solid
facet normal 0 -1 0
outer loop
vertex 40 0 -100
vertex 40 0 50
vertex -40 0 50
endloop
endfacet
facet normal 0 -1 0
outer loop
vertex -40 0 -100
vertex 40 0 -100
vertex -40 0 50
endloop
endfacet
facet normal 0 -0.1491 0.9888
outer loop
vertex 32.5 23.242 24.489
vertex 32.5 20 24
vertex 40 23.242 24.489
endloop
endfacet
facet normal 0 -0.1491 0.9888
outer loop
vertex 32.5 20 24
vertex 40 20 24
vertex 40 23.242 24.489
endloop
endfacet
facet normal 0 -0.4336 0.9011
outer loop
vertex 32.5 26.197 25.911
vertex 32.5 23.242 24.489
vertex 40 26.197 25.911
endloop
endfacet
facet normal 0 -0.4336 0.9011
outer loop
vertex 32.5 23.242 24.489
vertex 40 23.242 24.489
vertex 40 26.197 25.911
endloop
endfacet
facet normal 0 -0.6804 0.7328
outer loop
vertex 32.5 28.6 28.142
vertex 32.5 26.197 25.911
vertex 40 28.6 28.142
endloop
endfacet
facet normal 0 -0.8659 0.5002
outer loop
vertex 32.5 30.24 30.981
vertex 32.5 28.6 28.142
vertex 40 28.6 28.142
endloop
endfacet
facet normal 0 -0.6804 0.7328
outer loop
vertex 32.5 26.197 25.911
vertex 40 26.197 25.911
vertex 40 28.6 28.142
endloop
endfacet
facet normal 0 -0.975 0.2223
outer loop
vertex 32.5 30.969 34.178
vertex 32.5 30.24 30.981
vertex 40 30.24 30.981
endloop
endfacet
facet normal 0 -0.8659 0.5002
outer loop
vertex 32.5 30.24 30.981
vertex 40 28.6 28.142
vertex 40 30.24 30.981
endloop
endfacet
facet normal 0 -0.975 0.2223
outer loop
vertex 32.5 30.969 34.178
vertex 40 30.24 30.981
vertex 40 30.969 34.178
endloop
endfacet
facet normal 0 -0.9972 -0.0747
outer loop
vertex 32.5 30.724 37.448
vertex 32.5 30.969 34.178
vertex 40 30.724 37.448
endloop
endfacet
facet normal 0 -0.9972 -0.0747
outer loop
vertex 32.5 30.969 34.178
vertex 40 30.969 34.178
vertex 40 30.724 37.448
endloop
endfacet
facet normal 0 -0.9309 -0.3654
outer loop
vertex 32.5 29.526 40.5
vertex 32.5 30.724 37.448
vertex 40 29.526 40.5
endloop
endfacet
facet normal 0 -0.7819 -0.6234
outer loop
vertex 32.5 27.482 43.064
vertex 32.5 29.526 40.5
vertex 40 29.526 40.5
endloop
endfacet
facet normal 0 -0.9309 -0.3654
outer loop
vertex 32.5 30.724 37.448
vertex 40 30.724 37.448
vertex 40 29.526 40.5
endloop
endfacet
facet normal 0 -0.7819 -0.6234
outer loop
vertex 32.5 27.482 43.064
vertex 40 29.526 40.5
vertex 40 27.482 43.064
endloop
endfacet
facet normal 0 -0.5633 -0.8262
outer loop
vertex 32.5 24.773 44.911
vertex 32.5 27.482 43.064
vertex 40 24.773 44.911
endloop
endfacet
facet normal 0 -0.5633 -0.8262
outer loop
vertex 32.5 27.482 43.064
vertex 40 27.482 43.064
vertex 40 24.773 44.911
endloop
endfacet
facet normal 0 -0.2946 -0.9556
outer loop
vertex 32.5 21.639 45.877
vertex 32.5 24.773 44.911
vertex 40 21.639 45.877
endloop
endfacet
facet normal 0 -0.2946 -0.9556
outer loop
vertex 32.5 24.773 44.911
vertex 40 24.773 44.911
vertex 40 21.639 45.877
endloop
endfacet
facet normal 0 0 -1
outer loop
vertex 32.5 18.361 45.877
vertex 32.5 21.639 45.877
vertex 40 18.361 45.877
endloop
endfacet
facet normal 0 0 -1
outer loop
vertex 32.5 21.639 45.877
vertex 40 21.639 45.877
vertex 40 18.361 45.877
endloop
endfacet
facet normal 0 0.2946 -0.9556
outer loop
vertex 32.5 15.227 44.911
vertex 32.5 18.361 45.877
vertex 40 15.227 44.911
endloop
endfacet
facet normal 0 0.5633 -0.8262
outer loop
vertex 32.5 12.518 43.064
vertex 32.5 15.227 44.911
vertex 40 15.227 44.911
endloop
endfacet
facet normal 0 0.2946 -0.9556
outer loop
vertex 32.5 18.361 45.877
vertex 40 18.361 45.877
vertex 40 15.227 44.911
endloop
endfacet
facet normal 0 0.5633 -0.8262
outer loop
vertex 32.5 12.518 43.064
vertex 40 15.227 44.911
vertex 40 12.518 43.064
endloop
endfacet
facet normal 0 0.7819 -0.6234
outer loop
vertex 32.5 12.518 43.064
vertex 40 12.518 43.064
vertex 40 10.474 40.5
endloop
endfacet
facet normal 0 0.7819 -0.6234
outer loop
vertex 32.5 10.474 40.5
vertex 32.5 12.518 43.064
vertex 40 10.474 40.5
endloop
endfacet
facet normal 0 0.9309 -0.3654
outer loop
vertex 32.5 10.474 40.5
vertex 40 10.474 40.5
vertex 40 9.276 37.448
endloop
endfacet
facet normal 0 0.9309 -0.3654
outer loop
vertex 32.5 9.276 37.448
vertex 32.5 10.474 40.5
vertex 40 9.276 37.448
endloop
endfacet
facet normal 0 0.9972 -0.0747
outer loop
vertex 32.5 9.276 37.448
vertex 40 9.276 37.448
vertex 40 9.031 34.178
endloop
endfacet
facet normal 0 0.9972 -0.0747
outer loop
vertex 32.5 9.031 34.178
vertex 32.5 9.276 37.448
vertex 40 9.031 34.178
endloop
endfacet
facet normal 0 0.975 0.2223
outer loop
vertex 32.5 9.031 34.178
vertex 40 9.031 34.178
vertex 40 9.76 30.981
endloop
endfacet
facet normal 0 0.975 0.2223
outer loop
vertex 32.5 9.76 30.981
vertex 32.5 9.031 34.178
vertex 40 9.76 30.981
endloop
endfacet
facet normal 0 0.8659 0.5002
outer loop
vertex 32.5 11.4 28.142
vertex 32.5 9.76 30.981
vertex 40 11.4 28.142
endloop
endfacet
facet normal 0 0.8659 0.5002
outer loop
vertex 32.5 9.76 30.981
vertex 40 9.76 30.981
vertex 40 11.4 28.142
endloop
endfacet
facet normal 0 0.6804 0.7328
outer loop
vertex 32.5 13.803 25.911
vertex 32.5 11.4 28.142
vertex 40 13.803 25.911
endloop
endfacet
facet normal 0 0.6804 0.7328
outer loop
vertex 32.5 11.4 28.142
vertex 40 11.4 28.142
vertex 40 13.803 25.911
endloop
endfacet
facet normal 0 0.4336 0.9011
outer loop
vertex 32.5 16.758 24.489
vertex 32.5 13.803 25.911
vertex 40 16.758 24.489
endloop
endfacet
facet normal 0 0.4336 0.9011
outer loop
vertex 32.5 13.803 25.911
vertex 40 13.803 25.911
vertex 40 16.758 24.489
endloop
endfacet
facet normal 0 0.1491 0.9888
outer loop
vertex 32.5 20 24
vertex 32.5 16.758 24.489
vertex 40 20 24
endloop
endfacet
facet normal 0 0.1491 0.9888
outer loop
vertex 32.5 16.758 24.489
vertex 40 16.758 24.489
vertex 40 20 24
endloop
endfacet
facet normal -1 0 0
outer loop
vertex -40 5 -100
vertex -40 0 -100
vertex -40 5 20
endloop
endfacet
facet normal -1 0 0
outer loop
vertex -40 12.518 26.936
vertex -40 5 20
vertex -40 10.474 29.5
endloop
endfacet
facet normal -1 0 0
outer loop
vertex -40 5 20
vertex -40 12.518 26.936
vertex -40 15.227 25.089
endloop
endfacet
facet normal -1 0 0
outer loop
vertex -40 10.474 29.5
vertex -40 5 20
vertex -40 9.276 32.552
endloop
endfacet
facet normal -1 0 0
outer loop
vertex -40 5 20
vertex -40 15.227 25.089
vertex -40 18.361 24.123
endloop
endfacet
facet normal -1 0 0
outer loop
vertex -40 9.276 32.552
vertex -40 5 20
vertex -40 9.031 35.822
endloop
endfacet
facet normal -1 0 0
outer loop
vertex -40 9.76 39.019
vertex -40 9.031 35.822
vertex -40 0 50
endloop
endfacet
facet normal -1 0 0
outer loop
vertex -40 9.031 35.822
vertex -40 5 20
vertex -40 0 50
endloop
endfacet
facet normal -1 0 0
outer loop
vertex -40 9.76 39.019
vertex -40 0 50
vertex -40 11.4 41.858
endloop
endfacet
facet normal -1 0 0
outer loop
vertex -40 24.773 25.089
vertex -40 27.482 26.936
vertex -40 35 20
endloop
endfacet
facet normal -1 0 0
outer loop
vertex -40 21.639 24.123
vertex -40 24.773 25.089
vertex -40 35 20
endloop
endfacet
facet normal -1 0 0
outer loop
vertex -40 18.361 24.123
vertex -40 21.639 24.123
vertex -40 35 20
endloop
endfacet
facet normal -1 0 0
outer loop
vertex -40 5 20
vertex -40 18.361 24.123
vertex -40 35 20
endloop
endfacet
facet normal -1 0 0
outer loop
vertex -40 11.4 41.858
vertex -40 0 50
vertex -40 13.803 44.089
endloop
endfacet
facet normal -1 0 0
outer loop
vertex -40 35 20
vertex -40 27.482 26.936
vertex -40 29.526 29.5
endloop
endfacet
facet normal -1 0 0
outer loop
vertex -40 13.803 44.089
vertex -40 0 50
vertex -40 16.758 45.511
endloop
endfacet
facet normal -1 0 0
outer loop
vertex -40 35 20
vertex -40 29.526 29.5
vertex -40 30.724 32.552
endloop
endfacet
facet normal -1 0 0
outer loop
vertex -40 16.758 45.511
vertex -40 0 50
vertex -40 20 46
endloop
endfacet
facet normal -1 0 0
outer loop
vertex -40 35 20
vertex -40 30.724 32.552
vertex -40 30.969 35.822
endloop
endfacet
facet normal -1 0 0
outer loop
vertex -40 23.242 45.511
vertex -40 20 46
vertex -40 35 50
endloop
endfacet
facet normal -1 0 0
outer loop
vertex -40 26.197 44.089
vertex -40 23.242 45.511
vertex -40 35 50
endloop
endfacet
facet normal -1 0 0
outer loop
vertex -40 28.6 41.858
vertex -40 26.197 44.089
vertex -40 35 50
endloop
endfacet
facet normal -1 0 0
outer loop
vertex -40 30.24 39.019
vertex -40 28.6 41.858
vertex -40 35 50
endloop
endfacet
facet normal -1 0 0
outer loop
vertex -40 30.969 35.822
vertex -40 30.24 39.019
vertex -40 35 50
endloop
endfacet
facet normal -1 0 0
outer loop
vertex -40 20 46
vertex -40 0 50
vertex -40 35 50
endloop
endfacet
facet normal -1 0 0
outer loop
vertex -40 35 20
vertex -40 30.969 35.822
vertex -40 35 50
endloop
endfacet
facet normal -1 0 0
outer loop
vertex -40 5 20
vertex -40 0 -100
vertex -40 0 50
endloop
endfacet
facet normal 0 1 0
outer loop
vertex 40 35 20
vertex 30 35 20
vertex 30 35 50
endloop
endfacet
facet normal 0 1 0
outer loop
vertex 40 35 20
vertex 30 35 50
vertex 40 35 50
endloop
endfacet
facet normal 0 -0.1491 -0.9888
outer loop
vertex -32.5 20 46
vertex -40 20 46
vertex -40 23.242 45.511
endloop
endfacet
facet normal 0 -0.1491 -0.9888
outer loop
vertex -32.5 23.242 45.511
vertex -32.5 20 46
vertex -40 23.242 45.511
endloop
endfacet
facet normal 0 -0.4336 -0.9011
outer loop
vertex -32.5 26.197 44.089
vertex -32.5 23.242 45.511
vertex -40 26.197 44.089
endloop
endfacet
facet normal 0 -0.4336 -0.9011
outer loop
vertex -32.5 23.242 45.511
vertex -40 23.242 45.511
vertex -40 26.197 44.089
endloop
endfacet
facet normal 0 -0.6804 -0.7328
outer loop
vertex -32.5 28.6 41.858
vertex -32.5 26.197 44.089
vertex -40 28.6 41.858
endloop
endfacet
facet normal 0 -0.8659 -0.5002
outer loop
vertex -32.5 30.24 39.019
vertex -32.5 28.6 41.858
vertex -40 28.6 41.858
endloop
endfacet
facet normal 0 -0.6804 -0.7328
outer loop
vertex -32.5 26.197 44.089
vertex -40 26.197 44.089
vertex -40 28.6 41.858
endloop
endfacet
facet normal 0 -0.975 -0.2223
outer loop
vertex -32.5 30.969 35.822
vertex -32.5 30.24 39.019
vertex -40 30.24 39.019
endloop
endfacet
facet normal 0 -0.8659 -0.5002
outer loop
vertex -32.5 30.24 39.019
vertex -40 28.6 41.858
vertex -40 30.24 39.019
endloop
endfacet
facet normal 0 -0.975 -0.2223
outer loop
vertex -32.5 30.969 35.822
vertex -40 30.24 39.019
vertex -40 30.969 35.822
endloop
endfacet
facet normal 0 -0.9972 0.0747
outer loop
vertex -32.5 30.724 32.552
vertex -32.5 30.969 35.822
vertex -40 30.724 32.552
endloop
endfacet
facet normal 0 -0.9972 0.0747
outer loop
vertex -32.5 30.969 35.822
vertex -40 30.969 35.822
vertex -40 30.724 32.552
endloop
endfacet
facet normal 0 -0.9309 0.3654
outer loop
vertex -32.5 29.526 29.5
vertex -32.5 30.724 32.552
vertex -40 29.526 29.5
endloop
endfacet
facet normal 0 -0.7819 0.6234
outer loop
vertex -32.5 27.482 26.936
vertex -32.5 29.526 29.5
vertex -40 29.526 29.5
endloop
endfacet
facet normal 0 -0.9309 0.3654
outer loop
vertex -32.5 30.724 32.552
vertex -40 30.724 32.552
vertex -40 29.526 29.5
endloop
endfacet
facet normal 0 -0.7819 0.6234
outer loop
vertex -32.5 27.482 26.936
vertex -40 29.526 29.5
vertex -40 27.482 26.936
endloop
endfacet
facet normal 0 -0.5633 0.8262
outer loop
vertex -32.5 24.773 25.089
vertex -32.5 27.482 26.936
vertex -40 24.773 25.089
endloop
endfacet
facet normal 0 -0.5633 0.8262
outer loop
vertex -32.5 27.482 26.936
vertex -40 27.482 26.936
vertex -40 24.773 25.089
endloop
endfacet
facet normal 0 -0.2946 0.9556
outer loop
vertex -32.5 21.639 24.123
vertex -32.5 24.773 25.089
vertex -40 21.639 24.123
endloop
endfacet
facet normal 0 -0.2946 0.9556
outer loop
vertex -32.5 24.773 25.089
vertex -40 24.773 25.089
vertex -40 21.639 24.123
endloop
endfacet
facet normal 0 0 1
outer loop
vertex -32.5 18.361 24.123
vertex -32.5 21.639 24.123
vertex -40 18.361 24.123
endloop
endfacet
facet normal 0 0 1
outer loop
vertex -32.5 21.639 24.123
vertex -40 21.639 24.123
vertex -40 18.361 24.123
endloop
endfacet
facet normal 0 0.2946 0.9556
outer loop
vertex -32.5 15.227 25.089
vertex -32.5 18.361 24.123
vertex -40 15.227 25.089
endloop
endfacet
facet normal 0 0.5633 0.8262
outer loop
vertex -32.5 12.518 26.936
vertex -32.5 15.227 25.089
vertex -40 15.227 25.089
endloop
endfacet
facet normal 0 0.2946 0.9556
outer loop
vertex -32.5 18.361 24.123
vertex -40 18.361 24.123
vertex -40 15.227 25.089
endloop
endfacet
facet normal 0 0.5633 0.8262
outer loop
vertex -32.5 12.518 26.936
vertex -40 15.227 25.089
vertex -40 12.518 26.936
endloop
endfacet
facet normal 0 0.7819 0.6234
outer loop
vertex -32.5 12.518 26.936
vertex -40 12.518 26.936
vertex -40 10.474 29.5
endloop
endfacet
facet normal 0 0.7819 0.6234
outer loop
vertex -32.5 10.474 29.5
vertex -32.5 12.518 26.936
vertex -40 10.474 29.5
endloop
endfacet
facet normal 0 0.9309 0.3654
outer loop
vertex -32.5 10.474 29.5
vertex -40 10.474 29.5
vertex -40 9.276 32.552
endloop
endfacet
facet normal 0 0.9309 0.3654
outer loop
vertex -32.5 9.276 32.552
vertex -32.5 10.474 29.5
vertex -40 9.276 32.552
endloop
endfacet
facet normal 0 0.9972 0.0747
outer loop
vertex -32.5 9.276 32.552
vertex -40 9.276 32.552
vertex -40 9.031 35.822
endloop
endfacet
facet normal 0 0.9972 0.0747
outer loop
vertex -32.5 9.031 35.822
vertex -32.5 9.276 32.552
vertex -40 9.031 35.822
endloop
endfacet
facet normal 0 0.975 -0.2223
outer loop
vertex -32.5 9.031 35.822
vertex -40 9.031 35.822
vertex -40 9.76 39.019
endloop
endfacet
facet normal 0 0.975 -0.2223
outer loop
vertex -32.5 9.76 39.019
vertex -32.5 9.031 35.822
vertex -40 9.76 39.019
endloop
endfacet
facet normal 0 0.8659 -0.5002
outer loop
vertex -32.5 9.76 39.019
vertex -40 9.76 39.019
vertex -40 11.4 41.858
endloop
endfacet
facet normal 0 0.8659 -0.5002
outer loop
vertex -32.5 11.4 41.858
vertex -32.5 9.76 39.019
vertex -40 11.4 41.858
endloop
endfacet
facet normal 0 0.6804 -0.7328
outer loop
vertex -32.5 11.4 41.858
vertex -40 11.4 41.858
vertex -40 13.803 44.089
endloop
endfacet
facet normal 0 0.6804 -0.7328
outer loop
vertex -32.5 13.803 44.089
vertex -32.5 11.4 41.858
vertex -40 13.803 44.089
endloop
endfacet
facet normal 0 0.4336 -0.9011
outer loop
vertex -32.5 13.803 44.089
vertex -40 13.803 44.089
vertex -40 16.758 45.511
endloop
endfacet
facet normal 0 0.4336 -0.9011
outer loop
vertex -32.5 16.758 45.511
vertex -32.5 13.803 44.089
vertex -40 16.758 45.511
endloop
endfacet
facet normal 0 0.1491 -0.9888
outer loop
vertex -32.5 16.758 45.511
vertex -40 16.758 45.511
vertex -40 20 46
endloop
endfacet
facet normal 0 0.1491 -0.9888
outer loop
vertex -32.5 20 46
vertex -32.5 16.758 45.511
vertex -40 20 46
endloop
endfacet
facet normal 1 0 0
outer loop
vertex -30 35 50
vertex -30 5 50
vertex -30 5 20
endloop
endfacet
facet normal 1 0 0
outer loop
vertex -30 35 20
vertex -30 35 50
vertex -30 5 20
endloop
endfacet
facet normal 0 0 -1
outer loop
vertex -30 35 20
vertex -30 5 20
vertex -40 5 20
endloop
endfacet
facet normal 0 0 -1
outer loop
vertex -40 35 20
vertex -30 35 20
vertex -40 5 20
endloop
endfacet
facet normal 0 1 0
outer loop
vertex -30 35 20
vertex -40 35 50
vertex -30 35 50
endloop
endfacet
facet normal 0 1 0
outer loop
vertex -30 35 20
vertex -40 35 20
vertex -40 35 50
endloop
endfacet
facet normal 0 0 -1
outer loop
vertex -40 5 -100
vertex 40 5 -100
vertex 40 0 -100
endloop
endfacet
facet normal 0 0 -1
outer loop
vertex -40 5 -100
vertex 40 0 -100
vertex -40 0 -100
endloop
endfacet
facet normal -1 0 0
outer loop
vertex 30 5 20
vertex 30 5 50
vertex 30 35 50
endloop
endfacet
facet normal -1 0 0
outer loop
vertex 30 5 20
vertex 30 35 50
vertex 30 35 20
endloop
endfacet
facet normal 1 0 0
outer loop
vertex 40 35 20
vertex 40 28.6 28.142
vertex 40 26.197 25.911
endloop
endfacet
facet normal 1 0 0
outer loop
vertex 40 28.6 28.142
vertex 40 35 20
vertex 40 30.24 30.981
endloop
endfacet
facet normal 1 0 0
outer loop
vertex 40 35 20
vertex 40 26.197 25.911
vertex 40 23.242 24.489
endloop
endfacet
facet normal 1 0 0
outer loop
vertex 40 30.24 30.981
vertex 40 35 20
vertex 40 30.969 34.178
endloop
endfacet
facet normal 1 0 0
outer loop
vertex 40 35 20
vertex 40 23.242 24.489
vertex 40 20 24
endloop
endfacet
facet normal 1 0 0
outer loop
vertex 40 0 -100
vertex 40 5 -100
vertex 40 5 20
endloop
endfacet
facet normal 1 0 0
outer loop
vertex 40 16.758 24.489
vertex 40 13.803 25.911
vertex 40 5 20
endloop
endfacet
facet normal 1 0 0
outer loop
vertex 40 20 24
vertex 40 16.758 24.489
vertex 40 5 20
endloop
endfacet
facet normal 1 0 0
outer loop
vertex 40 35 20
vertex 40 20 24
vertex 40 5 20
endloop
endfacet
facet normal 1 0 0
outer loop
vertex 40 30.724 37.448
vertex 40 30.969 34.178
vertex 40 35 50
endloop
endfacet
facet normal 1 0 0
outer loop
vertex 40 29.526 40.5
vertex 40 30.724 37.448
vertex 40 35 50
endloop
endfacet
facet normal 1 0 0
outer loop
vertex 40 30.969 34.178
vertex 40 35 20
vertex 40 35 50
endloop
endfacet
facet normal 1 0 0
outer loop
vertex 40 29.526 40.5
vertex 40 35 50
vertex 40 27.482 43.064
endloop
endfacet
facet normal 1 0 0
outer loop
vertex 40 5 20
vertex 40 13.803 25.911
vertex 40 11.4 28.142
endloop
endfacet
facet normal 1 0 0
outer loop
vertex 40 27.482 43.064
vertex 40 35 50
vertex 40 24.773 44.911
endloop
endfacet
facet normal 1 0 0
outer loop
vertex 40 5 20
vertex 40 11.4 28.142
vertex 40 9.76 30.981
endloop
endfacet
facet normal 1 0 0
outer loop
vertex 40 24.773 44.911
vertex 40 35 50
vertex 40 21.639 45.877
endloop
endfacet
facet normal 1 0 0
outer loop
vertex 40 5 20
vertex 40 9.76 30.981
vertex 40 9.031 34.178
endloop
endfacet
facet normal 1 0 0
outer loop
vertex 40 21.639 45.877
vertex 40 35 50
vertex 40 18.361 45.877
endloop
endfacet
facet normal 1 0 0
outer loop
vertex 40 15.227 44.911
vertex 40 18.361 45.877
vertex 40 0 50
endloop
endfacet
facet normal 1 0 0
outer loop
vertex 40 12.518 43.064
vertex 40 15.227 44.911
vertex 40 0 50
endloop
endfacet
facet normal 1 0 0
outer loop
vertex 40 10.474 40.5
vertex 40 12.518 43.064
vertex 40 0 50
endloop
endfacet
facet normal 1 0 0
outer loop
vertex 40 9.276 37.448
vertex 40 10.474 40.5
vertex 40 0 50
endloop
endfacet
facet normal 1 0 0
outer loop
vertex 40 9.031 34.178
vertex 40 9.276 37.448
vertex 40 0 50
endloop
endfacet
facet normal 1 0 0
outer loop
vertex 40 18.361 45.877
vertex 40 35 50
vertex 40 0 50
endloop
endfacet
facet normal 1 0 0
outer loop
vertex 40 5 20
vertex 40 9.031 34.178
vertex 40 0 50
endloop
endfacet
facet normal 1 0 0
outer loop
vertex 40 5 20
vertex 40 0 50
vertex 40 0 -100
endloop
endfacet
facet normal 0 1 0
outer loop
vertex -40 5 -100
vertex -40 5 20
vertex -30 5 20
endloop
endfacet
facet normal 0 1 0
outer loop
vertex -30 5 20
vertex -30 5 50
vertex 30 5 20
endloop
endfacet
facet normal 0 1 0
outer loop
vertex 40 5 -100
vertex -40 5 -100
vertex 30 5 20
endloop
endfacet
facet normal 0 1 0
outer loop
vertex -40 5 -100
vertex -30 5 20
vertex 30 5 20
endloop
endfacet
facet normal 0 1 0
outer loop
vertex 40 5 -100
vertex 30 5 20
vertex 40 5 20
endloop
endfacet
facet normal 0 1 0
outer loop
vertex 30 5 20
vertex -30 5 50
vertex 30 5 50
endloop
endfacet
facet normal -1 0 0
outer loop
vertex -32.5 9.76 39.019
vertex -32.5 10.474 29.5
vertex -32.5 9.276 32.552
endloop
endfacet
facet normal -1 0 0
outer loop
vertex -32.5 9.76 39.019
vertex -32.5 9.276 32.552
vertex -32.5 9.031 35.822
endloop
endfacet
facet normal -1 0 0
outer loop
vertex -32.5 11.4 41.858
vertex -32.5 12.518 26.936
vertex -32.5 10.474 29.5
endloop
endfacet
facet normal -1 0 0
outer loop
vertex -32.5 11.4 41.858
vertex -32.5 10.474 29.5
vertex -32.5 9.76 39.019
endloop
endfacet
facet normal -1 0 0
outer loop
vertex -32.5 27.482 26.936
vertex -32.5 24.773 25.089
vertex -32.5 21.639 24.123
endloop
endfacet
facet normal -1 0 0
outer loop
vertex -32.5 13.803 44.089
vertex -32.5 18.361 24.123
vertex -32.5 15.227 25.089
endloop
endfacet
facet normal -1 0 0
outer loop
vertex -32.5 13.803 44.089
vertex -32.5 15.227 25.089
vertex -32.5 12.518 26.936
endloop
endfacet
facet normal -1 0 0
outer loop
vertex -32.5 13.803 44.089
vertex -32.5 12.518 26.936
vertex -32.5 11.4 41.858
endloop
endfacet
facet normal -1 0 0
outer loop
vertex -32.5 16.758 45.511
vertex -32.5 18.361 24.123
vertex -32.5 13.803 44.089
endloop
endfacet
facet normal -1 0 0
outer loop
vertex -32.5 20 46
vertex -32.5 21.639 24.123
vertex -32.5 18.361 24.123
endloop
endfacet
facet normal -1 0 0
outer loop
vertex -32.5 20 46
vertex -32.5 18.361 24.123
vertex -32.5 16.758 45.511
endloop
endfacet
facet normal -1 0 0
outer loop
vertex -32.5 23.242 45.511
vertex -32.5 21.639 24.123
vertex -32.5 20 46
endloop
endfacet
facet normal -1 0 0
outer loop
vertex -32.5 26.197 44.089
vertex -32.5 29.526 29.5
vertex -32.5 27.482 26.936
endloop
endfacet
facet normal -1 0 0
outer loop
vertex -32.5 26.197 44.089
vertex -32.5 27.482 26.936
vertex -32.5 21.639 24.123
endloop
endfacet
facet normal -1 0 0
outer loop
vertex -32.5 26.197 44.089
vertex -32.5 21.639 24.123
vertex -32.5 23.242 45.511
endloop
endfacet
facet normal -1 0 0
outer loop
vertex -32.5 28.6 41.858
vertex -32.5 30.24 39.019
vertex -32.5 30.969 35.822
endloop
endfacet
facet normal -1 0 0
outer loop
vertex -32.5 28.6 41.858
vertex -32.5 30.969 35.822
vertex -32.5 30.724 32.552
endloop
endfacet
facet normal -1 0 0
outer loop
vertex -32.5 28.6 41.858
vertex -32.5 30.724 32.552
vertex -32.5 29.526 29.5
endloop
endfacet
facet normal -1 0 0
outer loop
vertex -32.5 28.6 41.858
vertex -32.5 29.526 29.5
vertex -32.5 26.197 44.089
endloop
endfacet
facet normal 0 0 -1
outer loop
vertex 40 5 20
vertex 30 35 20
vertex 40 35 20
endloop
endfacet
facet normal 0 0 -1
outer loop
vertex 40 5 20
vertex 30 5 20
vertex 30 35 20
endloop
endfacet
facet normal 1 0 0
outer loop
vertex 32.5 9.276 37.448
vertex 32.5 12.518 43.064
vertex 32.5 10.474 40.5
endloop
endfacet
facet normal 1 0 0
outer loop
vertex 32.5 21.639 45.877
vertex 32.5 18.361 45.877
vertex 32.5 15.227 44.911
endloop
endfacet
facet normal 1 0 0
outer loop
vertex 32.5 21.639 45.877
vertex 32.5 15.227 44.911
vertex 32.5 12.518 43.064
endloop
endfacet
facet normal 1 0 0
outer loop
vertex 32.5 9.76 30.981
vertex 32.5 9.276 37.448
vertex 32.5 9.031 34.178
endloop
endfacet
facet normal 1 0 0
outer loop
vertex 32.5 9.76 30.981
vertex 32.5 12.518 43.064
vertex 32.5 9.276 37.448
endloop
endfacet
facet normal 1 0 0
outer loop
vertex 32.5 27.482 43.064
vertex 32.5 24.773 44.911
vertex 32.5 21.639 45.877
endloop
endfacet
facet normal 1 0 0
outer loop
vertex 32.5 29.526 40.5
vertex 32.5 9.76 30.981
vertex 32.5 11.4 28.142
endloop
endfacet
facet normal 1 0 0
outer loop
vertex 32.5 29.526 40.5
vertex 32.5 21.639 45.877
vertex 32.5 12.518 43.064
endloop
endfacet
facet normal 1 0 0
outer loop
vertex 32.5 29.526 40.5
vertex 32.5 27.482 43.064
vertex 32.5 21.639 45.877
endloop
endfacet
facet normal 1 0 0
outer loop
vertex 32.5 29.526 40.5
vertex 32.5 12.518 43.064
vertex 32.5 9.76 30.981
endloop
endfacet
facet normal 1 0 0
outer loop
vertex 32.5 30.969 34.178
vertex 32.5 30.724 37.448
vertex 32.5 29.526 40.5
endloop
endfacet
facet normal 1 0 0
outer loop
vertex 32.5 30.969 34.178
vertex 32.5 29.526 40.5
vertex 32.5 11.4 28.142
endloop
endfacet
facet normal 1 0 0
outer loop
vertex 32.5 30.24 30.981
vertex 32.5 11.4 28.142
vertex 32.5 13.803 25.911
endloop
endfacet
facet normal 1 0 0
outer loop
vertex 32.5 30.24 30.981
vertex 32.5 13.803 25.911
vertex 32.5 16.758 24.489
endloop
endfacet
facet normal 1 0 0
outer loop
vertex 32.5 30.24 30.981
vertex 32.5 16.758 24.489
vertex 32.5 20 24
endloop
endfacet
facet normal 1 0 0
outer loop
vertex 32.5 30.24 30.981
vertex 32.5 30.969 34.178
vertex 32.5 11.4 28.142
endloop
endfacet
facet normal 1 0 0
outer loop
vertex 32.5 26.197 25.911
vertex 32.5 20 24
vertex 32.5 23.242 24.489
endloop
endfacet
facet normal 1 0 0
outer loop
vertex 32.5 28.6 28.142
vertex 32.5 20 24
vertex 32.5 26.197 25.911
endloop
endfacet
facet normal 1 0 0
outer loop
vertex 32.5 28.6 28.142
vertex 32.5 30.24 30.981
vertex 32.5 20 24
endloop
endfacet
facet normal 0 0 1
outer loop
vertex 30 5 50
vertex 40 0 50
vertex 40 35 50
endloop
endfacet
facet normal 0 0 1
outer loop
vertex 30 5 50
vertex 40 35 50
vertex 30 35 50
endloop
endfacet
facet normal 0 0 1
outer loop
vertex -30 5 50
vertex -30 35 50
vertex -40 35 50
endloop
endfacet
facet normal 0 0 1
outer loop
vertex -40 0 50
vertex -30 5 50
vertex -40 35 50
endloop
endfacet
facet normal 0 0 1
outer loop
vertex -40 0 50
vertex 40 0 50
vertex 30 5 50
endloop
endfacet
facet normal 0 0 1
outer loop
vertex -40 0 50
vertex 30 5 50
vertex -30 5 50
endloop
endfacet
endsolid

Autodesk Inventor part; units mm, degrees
ref_plane "YZ Plane" through (0, 0, 0) normal (1, 0, 0) x (0, 1, 0)
ref_plane "XZ Plane" through (0, 0, 0) normal (0, 1, 0) x (-1, 0, 0)
ref_plane "XY Plane" through (0, 0, 0) normal (0, 0, 1) x (1, 0, 0)
sketch "Sketch1" plane through (0, 0, 0) normal (0, 1, 0) x (-1, 0, 0)
  line L0 (-40, 50) -> (40, 50)
  line L1 (40, 50) -> (40, -50)
  line L2 (40, -50) -> (-40, -50)
  line L3 (-40, -50) -> (-40, 50)
  line L4 (-40, 50) -> (40, -50) construction
  line L5 (40, 50) -> (-40, -50) construction
  point P0 (0, 0)
  dimension "d0" = 80
  dimension "d1" = 100
extrude "Extrusion1" add sketch "Sketch1" along normal blind 5
sketch "Sketch2" plane through (0, 5, 0) normal (0, 1, 0) x (1, 0, 0)
  line L0 (-40, -50) -> (-30, -50)
  line L1 (-30, -50) -> (-30, -20)
  line L2 (-30, -20) -> (-40, -20)
  line L3 (-40, -20) -> (-40, -50)
  line L4 (40, -50) -> (30, -50)
  line L5 (30, -50) -> (30, -20)
  line L6 (30, -20) -> (40, -20)
  line L7 (40, -20) -> (40, -50)
  point P0 (0, 0)
  dimension "d4" = 10
  dimension "d5" = 30
  dimension "d6" = 10
  dimension "d7" = 30
extrude "Extrusion2" add sketch "Sketch2" along normal blind 30
sketch "Sketch3" plane through (-40, 0, -50) normal (-1, 0, 0) x (0, 0, 1)
  circle A0 centre (85, 20) radius 11
  point P0 (50, 0)
  dimension "d10" = 22
extrude "Extrusion3" cut sketch "Sketch3" against normal blind 7.5
sketch "Sketch4" plane through (40, 0, 50) normal (1, 0, 0) x (0, 0, -1)
  circle A0 centre (15, 20) radius 11 projected
  circle A1 centre (15, 20) radius 11
  point P0 (50, 0)
extrude "Extrusion4" cut sketch "Sketch4" against normal blind 7.5
sketch "Sketch6" plane through (40, 0, -50) normal (0, 0, -1) x (-1, 0, 0)
  line L0 (80, 5) -> (0, 5)
  line L1 (0, 5) -> (0, 0)
  line L2 (0, 0) -> (80, 0)
  line L3 (80, 0) -> (80, 5)
  point P0 (40, 0)
extrude "Extrusion5" add sketch "Sketch6" along normal blind 50
properties part number "BassGtrBotBase"
